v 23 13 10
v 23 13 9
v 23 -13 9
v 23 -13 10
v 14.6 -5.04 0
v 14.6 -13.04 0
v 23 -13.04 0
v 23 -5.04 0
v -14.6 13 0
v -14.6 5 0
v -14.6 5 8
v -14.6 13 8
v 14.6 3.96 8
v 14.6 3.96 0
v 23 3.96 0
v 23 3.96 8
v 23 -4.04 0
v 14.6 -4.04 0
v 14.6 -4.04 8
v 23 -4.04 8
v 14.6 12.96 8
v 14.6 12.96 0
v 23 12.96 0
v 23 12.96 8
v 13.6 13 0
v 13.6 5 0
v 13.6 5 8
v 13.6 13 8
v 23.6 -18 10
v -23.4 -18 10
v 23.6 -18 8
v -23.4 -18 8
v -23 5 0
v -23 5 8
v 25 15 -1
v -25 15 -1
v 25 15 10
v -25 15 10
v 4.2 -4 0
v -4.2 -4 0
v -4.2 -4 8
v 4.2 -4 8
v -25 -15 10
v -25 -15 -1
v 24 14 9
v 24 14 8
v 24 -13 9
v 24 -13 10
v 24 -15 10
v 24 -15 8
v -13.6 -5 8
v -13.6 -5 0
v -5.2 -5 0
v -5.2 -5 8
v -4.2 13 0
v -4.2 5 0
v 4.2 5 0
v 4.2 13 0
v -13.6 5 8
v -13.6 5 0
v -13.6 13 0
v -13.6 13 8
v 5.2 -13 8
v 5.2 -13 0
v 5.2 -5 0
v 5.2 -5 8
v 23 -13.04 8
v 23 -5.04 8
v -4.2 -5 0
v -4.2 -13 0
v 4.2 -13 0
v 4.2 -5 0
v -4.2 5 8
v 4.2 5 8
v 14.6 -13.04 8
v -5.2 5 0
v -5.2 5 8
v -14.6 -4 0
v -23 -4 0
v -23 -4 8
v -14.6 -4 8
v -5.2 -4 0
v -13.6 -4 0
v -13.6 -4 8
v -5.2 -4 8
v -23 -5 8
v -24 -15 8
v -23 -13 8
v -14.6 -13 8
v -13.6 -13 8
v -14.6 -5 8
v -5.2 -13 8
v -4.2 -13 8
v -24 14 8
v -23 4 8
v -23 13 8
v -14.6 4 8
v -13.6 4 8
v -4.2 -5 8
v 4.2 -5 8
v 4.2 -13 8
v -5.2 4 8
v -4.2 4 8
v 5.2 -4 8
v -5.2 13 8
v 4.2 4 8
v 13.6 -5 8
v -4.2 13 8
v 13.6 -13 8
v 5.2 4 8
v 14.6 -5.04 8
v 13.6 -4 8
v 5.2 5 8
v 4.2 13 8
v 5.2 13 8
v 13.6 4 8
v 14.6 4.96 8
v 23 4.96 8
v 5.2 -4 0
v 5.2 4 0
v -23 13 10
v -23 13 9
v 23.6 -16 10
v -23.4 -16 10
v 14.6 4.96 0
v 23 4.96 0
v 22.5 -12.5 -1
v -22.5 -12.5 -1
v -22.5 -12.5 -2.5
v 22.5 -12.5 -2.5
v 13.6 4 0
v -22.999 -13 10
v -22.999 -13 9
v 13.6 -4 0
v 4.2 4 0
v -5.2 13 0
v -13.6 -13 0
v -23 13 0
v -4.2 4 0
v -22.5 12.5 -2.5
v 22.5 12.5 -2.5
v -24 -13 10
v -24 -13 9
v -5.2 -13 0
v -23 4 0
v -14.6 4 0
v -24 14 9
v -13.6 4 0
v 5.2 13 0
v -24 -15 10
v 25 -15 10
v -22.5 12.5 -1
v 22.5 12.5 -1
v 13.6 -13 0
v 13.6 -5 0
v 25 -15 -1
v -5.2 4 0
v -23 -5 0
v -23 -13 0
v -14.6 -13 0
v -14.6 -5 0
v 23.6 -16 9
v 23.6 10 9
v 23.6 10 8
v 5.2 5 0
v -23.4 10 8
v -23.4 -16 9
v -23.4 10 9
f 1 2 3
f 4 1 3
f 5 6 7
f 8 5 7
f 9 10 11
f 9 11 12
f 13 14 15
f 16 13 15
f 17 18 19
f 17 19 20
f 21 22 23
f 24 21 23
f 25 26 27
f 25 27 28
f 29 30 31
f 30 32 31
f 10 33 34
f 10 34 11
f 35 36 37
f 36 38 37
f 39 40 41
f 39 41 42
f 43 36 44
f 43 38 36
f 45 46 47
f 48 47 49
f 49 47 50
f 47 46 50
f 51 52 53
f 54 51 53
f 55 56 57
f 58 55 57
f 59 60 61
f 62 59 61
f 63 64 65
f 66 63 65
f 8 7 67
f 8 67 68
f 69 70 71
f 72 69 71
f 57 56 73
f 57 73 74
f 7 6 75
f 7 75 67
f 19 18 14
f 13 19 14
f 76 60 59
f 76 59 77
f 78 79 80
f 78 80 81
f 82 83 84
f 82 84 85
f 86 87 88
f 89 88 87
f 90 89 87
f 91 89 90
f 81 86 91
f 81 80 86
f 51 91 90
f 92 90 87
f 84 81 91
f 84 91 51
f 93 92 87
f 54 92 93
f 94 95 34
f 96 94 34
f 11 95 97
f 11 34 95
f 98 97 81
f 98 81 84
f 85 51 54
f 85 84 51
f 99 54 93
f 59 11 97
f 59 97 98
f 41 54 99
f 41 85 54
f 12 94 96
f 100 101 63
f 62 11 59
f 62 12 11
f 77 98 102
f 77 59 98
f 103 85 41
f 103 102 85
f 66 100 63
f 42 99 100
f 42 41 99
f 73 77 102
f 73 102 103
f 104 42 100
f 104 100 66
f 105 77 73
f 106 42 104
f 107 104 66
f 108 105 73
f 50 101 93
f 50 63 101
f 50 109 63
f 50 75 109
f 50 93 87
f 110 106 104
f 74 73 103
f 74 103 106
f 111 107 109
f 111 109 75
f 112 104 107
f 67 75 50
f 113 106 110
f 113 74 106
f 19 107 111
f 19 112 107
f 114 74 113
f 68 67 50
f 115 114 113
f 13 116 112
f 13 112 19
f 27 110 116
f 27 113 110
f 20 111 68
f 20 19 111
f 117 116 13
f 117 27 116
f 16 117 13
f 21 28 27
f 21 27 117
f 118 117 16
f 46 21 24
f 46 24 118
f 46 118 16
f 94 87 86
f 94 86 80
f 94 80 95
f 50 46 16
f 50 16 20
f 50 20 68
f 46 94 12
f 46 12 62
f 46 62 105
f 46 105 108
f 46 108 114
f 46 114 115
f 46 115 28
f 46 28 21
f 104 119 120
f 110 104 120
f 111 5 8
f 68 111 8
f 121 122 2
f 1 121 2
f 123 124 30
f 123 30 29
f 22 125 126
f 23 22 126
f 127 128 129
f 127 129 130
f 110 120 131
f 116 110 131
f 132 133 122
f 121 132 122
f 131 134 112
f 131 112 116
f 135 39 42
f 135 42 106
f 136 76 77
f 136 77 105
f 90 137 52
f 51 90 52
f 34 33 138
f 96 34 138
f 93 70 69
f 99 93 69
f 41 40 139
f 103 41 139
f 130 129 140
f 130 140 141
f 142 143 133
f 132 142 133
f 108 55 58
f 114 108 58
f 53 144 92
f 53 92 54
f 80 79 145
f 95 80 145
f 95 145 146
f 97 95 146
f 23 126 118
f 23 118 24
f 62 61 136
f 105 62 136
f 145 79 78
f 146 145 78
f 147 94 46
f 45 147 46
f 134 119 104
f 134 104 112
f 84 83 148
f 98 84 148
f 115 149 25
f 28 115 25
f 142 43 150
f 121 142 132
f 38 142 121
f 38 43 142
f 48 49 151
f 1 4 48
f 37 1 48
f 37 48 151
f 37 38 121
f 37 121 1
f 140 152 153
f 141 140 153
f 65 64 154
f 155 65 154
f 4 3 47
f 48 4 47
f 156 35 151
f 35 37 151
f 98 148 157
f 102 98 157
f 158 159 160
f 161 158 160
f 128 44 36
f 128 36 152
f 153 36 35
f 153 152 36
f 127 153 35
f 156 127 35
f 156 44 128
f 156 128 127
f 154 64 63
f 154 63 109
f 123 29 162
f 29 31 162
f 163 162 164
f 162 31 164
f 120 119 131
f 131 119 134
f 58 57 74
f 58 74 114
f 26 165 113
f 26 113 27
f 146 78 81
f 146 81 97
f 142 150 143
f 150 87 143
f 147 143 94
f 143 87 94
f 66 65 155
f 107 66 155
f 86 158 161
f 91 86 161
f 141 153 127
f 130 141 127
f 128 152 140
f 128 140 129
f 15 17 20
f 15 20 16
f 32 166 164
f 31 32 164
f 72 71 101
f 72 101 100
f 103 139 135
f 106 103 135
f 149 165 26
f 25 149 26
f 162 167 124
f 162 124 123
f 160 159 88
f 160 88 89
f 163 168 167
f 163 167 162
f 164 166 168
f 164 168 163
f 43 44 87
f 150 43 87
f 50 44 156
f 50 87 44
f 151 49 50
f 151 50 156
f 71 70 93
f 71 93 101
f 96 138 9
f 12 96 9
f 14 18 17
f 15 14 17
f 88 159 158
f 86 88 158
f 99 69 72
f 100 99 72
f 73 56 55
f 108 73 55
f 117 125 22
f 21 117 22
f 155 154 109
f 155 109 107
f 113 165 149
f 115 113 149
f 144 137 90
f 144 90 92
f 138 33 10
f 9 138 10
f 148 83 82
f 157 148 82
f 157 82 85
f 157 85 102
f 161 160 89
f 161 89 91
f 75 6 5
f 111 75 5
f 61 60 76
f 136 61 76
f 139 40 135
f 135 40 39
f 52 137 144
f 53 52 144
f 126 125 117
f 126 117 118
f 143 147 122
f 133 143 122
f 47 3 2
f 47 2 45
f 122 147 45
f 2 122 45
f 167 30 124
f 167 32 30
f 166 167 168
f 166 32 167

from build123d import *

# Parameters (mm, degrees)
F0_W      = 50
F0_H      = 30
F0_W_2    = 8.4
F0_H_2    = 8
F1_DEPTH  = 8
F3_DEPTH  = 1
F5_DEPTH  = 1
F6_W      = 50
F6_H      = 30
F7_DEPTH  = 1
F9_W      = 45
F9_H      = 25
F10_DEPTH = 1.5
F8_W      = 47
F8_H      = 28
F11_DEPTH = 1
F12_W     = 47
F12_H     = 2
F13_DEPTH = 1


with BuildPart() as f1:
    # F0 (on Top) → F1 (new body)
    with BuildSketch(Plane.XY):
        Rectangle(F0_W, F0_H)
        with Locations((-18.8, -9)):
            Rectangle(F0_W_2, F0_H_2, mode=Mode.SUBTRACT)
        with Locations((-9.4, -9)):
            Rectangle(F0_W_2, F0_H_2, mode=Mode.SUBTRACT)
        with Locations((0, -9)):
            Rectangle(F0_W_2, F0_H_2, mode=Mode.SUBTRACT)
        with Locations((9.4, -9)):
            Rectangle(F0_W_2, F0_H_2, mode=Mode.SUBTRACT)
        with Locations((18.8, -9.04)):
            Rectangle(F0_W_2, F0_H_2, mode=Mode.SUBTRACT)
        with Locations((18.8, -0.04)):
            Rectangle(F0_W_2, F0_H_2, mode=Mode.SUBTRACT)
        with Locations((-18.8, 0)):
            Rectangle(F0_W_2, F0_H_2, mode=Mode.SUBTRACT)
        with Locations((-9.4, 0)):
            Rectangle(F0_W_2, F0_H_2, mode=Mode.SUBTRACT)
        with Locations((-18.8, 9)):
            Rectangle(F0_W_2, F0_H_2, mode=Mode.SUBTRACT)
        with Locations((-9.4, 9)):
            Rectangle(F0_W_2, F0_H_2, mode=Mode.SUBTRACT)
        Rectangle(F0_W_2, F0_H_2, mode=Mode.SUBTRACT)
        with Locations((9.4, 0)):
            Rectangle(F0_W_2, F0_H_2, mode=Mode.SUBTRACT)
        with Locations((0, 9)):
            Rectangle(F0_W_2, F0_H_2, mode=Mode.SUBTRACT)
        with Locations((9.4, 9)):
            Rectangle(F0_W_2, F0_H_2, mode=Mode.SUBTRACT)
        with Locations((18.8, 8.96)):
            Rectangle(F0_W_2, F0_H_2, mode=Mode.SUBTRACT)
    extrude(amount=F1_DEPTH)

    # F2 (on face) → F3 (join)
    with BuildSketch(Plane.XY.offset(8)):
        Polygon((-25, -15), (-24, -15), (-24, 14), (24, 14), (24, -15), (25, -15), (25, 15), (-25, 15), align=None)
    extrude(amount=F3_DEPTH)

    # F4 (on face) → F5 (join)
    with BuildSketch(Plane.XY.offset(9)):
        Polygon((-25, 15), (-25, -15), (-24, -15), (-24, -13), (-22.998554, -13), (-23, 13), (23, 13), (23, -13), (24, -13), (24, -15), (25, -15), (25, 15), align=None)
    extrude(amount=F5_DEPTH)

    # F6 (on face) → F7 (join)
    with BuildSketch(Plane(origin=(0, 0, 0), x_dir=(1, 0, 0), z_dir=(0, 0, -1))):
        Rectangle(F6_W, F6_H)
    extrude(amount=F7_DEPTH)

    # F9 (on face) → F10 (join)
    with BuildSketch(Plane(origin=(0, 0, -1), x_dir=(1, 0, 0), z_dir=(0, 0, -1))):
        Rectangle(F9_W, F9_H)
    extrude(amount=F10_DEPTH)


with BuildPart() as f11:
    # F8 (on face) → F11 (new body)
    with BuildSketch(Plane.XY.offset(8)):
        with Locations((0.100398, -4)):
            Rectangle(F8_W, F8_H)
    extrude(amount=F11_DEPTH)

    # F12 (on face) → F13 (join)
    with BuildSketch(Plane.XY.offset(9)):
        with Locations((0.100398, -17)):
            Rectangle(F12_W, F12_H)
    extrude(amount=F13_DEPTH)


solid = Compound([f1.part, f11.part])
